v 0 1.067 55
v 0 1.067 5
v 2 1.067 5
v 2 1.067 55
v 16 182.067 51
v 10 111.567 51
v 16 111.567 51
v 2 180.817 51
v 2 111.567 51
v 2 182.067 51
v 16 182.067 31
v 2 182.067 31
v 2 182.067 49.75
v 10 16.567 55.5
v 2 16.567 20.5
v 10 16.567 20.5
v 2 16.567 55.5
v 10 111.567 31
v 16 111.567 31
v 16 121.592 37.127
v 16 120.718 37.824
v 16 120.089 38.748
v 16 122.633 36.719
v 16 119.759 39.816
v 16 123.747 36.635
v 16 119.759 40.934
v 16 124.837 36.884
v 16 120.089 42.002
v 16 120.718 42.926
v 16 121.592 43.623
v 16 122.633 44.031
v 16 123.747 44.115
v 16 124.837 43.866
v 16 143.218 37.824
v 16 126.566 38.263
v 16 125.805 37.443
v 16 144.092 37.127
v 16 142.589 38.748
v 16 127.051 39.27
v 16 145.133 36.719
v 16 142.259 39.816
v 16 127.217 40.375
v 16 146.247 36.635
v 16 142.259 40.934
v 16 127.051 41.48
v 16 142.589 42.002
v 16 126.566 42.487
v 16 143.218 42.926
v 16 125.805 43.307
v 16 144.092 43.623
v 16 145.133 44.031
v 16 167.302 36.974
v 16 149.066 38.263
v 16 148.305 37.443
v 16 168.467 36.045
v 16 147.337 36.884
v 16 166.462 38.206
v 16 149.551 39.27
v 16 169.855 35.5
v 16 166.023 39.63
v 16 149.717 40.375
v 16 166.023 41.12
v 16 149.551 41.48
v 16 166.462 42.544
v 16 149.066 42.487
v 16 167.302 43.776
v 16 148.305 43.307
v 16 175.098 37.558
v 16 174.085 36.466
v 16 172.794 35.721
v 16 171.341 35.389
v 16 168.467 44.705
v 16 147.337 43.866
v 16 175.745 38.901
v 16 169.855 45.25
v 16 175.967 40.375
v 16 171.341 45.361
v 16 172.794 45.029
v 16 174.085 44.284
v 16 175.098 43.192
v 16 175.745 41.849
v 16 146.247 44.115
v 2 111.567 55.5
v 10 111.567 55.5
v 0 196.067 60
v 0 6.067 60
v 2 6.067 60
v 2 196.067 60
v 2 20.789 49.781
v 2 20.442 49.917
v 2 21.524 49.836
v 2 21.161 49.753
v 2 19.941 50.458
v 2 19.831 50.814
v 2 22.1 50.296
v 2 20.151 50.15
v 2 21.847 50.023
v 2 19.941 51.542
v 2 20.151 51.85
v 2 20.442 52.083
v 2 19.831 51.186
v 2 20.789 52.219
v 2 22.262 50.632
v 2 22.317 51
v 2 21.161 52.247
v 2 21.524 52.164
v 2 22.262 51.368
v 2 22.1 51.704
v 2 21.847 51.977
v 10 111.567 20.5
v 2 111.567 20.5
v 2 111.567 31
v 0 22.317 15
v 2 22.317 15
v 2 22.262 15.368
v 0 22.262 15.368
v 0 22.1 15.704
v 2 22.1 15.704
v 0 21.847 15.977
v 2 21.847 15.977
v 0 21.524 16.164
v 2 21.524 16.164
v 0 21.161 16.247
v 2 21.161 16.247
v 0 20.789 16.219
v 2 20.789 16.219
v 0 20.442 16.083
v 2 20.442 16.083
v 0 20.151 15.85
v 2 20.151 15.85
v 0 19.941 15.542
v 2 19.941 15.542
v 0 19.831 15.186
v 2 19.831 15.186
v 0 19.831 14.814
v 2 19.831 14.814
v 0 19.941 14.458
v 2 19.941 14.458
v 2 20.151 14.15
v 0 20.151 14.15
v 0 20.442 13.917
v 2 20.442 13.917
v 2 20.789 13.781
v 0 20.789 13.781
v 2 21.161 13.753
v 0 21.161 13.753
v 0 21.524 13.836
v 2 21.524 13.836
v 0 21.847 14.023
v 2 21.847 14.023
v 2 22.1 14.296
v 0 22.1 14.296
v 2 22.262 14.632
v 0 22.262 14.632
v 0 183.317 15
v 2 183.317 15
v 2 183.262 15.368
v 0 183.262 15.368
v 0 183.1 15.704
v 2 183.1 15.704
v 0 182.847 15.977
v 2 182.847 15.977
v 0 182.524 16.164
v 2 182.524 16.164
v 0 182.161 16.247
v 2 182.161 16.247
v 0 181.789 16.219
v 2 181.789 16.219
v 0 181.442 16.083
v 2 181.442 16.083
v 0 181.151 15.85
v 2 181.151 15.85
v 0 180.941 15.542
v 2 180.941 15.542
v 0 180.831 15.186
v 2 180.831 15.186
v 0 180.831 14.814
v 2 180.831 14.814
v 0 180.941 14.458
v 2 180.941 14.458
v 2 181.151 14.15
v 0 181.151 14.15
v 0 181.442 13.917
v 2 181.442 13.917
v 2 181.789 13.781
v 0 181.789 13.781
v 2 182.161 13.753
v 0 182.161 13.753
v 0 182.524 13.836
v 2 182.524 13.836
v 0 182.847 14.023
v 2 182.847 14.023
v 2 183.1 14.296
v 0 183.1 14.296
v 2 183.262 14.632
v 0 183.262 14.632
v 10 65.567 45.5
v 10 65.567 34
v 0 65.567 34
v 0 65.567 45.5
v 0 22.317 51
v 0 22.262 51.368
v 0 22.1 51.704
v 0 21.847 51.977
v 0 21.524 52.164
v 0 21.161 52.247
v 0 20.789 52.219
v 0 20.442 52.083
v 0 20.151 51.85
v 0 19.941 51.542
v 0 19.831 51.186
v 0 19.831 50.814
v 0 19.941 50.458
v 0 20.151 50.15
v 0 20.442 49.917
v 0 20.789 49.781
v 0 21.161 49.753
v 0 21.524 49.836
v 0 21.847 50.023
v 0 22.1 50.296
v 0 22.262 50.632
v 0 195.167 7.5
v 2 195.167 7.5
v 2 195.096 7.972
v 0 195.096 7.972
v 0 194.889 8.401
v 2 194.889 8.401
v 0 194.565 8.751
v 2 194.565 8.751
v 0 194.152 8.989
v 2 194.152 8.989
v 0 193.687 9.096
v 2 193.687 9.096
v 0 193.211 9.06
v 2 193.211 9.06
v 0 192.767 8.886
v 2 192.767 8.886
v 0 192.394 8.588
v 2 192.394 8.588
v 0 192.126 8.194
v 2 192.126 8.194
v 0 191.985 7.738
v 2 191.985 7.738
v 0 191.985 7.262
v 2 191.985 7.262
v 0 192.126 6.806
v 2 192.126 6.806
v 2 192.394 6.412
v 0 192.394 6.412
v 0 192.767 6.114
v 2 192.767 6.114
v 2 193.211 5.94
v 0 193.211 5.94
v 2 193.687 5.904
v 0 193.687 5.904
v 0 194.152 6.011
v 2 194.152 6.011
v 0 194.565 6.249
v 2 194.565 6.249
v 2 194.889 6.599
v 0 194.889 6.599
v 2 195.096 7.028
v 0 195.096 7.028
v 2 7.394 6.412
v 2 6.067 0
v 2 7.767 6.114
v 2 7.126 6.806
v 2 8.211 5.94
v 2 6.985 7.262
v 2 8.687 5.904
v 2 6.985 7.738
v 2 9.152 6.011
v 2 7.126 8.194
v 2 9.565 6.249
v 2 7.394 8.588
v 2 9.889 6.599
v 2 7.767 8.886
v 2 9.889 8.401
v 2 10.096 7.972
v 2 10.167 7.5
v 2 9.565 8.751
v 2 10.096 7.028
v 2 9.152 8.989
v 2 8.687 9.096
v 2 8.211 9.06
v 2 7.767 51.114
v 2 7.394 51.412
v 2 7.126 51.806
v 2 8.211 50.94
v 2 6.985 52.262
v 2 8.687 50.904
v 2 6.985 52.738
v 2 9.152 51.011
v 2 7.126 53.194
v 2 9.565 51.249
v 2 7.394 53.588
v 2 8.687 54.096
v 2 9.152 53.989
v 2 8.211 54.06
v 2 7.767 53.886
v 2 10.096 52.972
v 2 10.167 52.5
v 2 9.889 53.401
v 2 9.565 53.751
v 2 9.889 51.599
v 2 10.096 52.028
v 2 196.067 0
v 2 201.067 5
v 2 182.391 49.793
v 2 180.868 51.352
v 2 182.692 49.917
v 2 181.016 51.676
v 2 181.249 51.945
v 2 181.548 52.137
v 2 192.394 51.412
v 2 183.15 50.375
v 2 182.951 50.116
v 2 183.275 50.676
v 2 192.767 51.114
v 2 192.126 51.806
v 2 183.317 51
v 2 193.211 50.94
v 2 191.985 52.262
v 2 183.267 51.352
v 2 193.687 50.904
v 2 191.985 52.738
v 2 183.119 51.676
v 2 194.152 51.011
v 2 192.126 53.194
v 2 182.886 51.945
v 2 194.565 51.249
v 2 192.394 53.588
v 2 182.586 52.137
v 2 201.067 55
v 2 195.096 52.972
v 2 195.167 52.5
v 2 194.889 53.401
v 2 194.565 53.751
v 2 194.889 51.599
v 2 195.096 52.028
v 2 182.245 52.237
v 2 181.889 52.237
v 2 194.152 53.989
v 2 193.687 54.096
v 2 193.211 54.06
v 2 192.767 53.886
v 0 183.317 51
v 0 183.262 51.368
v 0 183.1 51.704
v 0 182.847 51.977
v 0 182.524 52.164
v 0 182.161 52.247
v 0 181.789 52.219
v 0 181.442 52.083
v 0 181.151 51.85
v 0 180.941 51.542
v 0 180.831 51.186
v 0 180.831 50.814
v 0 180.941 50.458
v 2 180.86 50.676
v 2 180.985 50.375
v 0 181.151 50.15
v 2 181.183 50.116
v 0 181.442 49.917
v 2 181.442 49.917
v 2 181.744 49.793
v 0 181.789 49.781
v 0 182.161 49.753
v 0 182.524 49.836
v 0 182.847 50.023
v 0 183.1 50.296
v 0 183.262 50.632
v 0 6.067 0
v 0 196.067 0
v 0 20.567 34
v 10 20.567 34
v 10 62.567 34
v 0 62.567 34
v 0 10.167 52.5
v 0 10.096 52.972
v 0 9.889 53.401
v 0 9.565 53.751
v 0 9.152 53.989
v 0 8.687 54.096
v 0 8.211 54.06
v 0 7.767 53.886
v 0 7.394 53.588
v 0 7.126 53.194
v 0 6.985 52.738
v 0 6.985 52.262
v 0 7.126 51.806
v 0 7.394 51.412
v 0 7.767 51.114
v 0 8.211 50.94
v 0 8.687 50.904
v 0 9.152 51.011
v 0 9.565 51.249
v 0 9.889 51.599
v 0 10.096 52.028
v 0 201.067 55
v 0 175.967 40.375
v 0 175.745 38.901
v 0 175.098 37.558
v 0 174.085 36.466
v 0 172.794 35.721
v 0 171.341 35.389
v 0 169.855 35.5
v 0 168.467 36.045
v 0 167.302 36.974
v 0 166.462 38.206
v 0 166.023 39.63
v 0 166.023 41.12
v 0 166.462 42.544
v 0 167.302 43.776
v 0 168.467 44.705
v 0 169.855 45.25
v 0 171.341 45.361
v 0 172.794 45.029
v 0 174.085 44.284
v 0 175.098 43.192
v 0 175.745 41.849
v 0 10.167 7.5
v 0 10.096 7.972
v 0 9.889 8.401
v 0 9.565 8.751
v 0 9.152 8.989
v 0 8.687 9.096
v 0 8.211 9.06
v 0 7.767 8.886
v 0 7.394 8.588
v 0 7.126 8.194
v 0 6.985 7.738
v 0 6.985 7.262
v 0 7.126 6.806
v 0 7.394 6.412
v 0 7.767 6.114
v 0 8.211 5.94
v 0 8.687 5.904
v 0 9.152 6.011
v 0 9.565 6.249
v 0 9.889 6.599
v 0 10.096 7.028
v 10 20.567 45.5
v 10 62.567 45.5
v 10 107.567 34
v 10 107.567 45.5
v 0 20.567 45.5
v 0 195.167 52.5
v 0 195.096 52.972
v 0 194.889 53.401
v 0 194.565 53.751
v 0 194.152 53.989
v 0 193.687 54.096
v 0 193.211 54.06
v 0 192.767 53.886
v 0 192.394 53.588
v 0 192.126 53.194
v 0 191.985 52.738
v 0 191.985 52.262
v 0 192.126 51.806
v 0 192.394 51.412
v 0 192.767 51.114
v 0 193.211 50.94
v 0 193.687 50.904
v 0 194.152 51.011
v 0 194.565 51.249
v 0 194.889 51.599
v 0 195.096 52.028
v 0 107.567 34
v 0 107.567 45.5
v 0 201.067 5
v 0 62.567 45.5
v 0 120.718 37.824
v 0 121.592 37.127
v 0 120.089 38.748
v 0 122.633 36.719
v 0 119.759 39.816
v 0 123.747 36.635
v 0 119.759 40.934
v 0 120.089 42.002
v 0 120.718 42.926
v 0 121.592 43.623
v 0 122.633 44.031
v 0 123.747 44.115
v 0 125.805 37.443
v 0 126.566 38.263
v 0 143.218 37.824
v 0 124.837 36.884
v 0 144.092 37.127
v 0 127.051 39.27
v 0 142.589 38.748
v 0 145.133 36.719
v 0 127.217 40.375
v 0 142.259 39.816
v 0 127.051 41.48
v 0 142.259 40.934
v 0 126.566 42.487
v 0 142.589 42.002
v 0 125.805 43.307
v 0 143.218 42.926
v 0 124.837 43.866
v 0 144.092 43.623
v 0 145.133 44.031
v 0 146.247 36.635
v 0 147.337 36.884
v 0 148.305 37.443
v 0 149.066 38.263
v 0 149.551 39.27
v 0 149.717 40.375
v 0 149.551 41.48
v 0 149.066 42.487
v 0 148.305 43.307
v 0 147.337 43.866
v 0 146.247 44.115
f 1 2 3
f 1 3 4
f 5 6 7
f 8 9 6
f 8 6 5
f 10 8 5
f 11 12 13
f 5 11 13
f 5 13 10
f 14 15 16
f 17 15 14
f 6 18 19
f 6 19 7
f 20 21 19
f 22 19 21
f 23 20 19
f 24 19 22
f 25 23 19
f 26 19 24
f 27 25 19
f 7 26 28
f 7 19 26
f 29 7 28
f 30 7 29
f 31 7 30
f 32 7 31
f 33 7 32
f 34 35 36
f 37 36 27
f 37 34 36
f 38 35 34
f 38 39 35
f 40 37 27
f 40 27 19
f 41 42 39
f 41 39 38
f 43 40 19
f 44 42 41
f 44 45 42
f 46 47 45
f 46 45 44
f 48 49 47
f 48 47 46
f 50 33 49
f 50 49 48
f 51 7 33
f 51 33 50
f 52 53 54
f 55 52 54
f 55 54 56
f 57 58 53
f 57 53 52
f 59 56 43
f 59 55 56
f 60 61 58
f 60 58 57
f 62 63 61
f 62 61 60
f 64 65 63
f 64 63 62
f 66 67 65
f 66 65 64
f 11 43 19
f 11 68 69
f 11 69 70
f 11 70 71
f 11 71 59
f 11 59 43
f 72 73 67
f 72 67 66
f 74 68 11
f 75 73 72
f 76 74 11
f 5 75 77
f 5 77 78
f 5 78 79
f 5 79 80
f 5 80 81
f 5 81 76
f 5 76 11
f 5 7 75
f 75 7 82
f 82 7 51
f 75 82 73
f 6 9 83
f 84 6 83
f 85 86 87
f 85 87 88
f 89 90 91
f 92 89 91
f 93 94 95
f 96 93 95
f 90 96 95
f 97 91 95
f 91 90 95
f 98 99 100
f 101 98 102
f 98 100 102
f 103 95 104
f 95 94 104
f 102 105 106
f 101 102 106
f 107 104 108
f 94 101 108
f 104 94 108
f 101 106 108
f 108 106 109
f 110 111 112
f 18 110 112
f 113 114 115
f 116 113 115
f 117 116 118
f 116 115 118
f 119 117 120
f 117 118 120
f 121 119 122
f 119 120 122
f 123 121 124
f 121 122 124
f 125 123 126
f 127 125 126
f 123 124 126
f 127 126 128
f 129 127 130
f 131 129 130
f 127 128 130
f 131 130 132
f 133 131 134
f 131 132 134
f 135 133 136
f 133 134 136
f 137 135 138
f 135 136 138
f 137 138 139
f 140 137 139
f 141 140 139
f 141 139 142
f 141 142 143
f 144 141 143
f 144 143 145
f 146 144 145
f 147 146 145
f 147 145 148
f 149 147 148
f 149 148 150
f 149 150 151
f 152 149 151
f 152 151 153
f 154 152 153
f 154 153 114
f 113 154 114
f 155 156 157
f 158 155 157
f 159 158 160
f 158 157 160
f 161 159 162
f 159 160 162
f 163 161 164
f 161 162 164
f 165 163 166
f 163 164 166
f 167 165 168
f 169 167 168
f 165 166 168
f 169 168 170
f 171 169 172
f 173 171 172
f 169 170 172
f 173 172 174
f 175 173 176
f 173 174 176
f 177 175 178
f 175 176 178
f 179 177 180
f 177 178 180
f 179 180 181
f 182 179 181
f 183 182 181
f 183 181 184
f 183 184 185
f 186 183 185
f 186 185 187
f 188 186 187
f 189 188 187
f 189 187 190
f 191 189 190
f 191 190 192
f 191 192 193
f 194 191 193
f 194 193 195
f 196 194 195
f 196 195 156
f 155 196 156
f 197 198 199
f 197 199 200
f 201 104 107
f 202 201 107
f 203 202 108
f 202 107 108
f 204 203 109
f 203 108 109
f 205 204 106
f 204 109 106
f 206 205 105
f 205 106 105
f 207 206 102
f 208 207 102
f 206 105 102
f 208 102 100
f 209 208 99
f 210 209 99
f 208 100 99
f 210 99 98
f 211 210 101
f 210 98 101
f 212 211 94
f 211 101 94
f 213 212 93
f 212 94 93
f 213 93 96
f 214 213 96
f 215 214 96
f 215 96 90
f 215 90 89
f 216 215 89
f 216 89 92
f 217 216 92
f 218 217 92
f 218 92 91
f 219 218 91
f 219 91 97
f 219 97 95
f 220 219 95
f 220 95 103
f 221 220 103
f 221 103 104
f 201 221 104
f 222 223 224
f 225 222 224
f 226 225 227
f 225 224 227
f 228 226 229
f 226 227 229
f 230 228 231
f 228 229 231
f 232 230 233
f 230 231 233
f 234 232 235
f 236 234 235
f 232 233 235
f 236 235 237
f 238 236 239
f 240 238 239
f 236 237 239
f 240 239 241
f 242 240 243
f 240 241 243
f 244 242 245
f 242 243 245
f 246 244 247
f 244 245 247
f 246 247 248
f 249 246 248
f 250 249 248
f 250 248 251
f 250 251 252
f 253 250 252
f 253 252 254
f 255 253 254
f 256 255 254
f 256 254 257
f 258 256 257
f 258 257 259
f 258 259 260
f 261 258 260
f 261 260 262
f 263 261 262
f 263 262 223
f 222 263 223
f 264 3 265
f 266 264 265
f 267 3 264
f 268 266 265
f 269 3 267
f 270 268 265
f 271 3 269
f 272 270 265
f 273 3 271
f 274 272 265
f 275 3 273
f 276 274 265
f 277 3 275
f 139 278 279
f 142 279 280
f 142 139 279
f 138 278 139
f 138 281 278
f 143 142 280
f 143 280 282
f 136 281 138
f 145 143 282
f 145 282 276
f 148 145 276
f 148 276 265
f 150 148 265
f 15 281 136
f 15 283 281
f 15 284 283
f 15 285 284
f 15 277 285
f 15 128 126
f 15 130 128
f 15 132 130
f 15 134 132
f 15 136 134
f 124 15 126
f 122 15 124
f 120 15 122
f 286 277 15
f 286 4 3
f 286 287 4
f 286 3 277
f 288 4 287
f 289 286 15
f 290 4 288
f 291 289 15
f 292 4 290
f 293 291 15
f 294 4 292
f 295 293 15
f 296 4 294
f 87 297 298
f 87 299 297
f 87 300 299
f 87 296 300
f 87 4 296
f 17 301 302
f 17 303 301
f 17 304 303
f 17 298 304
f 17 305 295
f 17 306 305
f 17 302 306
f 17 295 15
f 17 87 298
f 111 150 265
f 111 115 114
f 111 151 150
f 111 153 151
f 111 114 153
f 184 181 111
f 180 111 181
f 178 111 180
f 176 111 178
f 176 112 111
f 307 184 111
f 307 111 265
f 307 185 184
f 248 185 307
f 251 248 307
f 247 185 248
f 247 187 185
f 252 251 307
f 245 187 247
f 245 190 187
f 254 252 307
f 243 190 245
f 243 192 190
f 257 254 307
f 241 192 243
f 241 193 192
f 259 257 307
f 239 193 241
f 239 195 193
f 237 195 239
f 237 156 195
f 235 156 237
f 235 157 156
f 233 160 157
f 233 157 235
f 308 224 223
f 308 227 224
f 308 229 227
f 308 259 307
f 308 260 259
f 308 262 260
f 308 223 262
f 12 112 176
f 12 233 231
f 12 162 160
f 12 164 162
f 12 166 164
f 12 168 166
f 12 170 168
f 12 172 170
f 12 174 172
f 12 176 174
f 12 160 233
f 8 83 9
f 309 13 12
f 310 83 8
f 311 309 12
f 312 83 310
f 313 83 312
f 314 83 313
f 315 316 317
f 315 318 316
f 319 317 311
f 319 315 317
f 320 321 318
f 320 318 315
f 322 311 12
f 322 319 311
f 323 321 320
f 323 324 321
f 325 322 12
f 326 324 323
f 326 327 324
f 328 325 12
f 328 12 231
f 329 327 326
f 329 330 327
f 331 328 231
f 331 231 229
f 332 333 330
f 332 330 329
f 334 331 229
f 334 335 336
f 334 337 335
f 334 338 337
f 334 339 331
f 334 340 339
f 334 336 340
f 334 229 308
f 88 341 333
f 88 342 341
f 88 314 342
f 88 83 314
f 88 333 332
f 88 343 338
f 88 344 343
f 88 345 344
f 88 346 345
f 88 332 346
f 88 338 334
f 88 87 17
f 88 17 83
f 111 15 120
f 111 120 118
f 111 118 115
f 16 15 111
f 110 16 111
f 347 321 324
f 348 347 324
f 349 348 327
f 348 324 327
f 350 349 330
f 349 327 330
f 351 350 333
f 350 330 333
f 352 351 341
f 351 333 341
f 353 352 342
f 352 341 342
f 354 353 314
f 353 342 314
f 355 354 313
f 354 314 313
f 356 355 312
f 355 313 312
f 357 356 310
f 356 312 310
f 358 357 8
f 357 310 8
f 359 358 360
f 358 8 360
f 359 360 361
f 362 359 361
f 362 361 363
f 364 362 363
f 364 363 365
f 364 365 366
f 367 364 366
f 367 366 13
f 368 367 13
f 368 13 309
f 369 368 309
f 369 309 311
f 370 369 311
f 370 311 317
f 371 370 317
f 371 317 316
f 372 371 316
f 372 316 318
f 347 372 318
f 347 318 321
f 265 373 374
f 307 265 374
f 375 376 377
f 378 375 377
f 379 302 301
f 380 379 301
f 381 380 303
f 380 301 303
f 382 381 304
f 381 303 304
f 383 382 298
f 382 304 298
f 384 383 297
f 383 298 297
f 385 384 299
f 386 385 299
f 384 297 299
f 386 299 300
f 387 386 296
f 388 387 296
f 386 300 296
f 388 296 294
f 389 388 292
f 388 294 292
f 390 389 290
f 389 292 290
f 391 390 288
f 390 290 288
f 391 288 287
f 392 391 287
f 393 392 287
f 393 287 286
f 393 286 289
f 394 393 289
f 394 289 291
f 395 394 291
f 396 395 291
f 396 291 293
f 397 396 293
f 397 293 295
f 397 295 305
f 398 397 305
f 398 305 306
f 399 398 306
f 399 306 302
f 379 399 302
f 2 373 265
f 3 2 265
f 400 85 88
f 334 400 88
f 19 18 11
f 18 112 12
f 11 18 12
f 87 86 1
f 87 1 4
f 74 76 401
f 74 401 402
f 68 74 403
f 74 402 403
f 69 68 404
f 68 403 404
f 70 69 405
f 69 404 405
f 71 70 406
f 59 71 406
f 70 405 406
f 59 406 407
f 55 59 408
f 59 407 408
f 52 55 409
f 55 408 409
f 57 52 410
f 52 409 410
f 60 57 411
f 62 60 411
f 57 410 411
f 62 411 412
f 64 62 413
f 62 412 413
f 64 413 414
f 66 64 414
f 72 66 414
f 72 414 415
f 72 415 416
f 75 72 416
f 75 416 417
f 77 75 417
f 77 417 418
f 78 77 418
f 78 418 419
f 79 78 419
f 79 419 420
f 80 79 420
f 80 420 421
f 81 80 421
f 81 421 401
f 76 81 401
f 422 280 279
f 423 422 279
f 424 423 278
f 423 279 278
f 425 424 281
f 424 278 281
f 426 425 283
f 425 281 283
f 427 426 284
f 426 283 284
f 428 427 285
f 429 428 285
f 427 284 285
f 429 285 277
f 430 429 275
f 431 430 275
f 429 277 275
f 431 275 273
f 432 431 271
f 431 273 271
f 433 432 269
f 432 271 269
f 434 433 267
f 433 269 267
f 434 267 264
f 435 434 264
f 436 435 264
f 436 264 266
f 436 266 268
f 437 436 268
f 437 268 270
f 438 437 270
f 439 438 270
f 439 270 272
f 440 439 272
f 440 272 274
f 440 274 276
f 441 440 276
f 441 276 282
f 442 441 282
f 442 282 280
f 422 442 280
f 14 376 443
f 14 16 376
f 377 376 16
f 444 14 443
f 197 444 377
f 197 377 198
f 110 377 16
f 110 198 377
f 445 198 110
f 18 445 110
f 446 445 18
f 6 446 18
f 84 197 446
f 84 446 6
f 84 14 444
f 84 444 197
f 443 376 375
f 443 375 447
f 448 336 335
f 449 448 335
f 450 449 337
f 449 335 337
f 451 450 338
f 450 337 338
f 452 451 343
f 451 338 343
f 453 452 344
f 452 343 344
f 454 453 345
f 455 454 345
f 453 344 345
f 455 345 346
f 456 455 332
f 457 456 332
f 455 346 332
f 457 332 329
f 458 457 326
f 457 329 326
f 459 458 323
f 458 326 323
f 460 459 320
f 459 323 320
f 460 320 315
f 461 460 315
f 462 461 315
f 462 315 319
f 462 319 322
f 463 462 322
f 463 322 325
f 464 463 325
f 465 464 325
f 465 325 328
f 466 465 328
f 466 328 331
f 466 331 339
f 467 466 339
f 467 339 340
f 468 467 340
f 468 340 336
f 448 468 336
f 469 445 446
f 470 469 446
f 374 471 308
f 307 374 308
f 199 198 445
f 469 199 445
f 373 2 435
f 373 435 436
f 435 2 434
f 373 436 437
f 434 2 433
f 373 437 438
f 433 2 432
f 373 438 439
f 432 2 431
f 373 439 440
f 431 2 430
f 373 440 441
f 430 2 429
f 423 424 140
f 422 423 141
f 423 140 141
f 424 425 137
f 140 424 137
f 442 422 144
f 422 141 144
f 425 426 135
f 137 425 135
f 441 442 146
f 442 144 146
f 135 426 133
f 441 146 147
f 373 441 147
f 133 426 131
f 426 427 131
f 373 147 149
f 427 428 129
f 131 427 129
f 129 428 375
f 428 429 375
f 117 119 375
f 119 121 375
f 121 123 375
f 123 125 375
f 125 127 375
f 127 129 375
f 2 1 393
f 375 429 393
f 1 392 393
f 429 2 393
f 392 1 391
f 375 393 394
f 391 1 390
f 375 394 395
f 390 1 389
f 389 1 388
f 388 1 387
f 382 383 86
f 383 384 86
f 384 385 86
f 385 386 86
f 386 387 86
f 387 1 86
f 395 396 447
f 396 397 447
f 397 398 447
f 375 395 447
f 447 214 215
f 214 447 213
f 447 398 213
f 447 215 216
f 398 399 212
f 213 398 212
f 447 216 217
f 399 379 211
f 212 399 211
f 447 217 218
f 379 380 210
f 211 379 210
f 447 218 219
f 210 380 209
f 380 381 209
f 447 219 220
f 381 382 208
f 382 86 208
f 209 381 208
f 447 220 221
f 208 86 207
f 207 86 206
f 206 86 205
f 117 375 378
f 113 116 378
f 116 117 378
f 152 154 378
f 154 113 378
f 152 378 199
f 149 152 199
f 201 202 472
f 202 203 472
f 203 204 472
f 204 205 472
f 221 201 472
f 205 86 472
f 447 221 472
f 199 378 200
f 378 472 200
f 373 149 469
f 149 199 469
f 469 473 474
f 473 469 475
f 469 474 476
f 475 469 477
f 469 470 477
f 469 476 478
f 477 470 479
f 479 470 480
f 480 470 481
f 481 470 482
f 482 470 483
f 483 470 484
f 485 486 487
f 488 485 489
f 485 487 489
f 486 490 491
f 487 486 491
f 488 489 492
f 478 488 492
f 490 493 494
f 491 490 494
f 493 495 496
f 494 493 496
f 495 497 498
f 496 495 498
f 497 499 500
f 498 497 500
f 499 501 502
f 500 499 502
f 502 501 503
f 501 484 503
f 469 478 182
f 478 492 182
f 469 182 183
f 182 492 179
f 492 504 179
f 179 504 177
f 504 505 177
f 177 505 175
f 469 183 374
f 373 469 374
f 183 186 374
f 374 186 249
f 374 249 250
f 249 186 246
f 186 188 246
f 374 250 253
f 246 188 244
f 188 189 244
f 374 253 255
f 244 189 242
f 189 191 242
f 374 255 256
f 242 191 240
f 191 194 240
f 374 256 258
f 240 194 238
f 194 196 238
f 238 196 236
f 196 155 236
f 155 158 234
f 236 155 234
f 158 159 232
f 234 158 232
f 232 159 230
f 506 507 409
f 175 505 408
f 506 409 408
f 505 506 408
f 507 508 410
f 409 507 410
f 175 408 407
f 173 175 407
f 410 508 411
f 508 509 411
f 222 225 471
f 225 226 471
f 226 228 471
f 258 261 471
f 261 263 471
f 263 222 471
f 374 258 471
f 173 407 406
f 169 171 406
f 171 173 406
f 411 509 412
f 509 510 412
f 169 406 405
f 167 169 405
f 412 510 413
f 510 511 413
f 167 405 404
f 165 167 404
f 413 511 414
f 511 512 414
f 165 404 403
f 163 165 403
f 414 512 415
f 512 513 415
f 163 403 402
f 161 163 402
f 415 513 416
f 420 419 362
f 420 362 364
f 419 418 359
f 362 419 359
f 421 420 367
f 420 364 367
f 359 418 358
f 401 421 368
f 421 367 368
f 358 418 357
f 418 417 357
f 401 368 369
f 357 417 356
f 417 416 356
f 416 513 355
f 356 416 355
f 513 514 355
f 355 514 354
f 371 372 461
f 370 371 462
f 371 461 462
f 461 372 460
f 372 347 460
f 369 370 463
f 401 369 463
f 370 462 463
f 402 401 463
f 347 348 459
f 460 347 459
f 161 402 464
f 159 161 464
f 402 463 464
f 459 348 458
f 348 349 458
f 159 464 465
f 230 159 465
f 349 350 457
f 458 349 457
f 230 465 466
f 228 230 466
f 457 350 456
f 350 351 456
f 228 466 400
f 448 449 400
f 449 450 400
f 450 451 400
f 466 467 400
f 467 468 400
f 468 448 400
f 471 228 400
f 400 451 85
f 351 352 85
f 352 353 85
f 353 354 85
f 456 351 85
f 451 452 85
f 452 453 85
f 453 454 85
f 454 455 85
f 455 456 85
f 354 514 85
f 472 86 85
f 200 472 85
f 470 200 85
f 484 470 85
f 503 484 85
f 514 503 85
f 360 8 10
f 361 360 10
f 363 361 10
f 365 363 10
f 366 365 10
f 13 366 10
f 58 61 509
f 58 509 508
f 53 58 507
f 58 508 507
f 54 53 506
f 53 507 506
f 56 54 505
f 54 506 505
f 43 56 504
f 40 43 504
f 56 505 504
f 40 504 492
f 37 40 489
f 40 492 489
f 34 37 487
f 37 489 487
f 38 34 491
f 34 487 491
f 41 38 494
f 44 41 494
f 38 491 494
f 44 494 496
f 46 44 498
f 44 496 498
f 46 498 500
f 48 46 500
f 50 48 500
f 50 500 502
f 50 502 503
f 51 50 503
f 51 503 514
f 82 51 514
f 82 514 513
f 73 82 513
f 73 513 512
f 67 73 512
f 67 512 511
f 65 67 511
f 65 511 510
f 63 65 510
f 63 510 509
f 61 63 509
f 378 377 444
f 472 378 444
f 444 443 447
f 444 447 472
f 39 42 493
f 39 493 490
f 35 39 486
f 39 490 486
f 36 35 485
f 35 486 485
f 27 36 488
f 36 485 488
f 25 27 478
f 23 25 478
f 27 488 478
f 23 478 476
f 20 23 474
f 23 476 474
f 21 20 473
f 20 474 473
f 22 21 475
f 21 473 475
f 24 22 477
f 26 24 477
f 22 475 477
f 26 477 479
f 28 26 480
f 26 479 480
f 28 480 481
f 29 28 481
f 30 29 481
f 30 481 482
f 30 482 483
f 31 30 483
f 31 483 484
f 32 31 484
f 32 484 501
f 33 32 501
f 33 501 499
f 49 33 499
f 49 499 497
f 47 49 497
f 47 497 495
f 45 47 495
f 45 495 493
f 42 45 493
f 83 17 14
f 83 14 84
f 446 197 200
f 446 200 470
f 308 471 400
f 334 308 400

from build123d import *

# Parameters (mm, degrees)
SKETCH_W        = 200
SKETCH_H        = 60
PAD_DEPTH       = 2
SKETCH002_R     = 1.6
POCKET001_DEPTH = 5
CHAMFER_SIZE    = 5
SKETCH004_R     = 1.25
POCKET_DEPTH    = 2.001
SKETCH003_W     = 95
SKETCH003_H     = 35
PAD001_DEPTH    = 8
SKETCH005_W     = 42
SKETCH005_H     = 11.5
POCKET002_DEPTH = 10.001
SKETCH006_W     = 70.5
SKETCH006_H     = 20
PAD002_DEPTH    = 14
SKETCH007_R     = 5
SKETCH007_R_2   = 3.75
POCKET003_DEPTH = 16.001


with BuildPart() as part:
    # Sketch → Pad (new body)
    with BuildSketch(Plane.YZ):
        with Locations((100, 30)):
            Rectangle(SKETCH_W, SKETCH_H)
    extrude(amount=PAD_DEPTH)

    # Sketch002 → Pocket001 (cut)
    with BuildSketch(Plane.YZ.offset(2)):
        with Locations((7.5, 52.5)):
            Circle(SKETCH002_R)
        with Locations((7.5, 7.5)):
            Circle(SKETCH002_R)
        with Locations((192.5, 7.5)):
            Circle(SKETCH002_R)
        with Locations((192.5, 52.5)):
            Circle(SKETCH002_R)
    extrude(amount=-POCKET001_DEPTH, mode=Mode.SUBTRACT)

    # Chamfer
    chamfer_edges = [part.edges().sort_by_distance(p)[0] for p in [
        (1, 0, 0),
        (1, 0, 60),
        (1, 200, 60),
        (1, 200, 0),
    ]]
    chamfer(chamfer_edges, length=CHAMFER_SIZE)

    # Sketch004 (on Face5 of Chamfer) → Pocket (cut, through all)
    with BuildSketch(Plane.YZ.offset(2)):
        with Locations((20, 51)):
            Circle(SKETCH004_R)
        with Locations((20, 15)):
            Circle(SKETCH004_R)
        with Locations((181, 15)):
            Circle(SKETCH004_R)
        with Locations((181, 51)):
            Circle(SKETCH004_R)
    extrude(amount=-POCKET_DEPTH, mode=Mode.SUBTRACT)

    # Sketch003 → Pad001 (join)
    with BuildSketch(Plane.YZ.offset(2)):
        with Locations((63, 38)):
            Rectangle(SKETCH003_W, SKETCH003_H)
    extrude(amount=PAD001_DEPTH)

    # Sketch005 (on Face24 of Pad001) → Pocket002 (cut, through all)
    with BuildSketch(Plane.YZ.offset(10)):
        with Locations((40.5, 39.75)):
            Rectangle(SKETCH005_W, SKETCH005_H)
        with Locations((85.5, 39.75)):
            Rectangle(SKETCH005_W, SKETCH005_H)
    extrude(amount=-POCKET002_DEPTH, mode=Mode.SUBTRACT)

    # Sketch006 (on Face5 of Pocket002) → Pad002 (join)
    with BuildSketch(Plane.YZ.offset(2)):
        with Locations((145.75, 41)):
            Rectangle(SKETCH006_W, SKETCH006_H)
    extrude(amount=PAD002_DEPTH)

    # Sketch007 (on Face2 of Pad002) → Pocket003 (cut, through all)
    with BuildSketch(Plane(origin=(0, 0, 0), x_dir=(0, 1, 0), z_dir=(-1, 0, 0))):
        with Locations((169.9, -40.375)):
            Circle(SKETCH007_R)
        with Locations((144.9, -40.375)):
            Circle(SKETCH007_R_2)
        with Locations((122.4, -40.375)):
            Circle(SKETCH007_R_2)
    extrude(amount=-POCKET003_DEPTH, mode=Mode.SUBTRACT)


with BuildPart() as part_1:
    # Body placement: moved
    add(part.part.moved(Location((0, 1.067224, 0))))


solid = part_1.part
